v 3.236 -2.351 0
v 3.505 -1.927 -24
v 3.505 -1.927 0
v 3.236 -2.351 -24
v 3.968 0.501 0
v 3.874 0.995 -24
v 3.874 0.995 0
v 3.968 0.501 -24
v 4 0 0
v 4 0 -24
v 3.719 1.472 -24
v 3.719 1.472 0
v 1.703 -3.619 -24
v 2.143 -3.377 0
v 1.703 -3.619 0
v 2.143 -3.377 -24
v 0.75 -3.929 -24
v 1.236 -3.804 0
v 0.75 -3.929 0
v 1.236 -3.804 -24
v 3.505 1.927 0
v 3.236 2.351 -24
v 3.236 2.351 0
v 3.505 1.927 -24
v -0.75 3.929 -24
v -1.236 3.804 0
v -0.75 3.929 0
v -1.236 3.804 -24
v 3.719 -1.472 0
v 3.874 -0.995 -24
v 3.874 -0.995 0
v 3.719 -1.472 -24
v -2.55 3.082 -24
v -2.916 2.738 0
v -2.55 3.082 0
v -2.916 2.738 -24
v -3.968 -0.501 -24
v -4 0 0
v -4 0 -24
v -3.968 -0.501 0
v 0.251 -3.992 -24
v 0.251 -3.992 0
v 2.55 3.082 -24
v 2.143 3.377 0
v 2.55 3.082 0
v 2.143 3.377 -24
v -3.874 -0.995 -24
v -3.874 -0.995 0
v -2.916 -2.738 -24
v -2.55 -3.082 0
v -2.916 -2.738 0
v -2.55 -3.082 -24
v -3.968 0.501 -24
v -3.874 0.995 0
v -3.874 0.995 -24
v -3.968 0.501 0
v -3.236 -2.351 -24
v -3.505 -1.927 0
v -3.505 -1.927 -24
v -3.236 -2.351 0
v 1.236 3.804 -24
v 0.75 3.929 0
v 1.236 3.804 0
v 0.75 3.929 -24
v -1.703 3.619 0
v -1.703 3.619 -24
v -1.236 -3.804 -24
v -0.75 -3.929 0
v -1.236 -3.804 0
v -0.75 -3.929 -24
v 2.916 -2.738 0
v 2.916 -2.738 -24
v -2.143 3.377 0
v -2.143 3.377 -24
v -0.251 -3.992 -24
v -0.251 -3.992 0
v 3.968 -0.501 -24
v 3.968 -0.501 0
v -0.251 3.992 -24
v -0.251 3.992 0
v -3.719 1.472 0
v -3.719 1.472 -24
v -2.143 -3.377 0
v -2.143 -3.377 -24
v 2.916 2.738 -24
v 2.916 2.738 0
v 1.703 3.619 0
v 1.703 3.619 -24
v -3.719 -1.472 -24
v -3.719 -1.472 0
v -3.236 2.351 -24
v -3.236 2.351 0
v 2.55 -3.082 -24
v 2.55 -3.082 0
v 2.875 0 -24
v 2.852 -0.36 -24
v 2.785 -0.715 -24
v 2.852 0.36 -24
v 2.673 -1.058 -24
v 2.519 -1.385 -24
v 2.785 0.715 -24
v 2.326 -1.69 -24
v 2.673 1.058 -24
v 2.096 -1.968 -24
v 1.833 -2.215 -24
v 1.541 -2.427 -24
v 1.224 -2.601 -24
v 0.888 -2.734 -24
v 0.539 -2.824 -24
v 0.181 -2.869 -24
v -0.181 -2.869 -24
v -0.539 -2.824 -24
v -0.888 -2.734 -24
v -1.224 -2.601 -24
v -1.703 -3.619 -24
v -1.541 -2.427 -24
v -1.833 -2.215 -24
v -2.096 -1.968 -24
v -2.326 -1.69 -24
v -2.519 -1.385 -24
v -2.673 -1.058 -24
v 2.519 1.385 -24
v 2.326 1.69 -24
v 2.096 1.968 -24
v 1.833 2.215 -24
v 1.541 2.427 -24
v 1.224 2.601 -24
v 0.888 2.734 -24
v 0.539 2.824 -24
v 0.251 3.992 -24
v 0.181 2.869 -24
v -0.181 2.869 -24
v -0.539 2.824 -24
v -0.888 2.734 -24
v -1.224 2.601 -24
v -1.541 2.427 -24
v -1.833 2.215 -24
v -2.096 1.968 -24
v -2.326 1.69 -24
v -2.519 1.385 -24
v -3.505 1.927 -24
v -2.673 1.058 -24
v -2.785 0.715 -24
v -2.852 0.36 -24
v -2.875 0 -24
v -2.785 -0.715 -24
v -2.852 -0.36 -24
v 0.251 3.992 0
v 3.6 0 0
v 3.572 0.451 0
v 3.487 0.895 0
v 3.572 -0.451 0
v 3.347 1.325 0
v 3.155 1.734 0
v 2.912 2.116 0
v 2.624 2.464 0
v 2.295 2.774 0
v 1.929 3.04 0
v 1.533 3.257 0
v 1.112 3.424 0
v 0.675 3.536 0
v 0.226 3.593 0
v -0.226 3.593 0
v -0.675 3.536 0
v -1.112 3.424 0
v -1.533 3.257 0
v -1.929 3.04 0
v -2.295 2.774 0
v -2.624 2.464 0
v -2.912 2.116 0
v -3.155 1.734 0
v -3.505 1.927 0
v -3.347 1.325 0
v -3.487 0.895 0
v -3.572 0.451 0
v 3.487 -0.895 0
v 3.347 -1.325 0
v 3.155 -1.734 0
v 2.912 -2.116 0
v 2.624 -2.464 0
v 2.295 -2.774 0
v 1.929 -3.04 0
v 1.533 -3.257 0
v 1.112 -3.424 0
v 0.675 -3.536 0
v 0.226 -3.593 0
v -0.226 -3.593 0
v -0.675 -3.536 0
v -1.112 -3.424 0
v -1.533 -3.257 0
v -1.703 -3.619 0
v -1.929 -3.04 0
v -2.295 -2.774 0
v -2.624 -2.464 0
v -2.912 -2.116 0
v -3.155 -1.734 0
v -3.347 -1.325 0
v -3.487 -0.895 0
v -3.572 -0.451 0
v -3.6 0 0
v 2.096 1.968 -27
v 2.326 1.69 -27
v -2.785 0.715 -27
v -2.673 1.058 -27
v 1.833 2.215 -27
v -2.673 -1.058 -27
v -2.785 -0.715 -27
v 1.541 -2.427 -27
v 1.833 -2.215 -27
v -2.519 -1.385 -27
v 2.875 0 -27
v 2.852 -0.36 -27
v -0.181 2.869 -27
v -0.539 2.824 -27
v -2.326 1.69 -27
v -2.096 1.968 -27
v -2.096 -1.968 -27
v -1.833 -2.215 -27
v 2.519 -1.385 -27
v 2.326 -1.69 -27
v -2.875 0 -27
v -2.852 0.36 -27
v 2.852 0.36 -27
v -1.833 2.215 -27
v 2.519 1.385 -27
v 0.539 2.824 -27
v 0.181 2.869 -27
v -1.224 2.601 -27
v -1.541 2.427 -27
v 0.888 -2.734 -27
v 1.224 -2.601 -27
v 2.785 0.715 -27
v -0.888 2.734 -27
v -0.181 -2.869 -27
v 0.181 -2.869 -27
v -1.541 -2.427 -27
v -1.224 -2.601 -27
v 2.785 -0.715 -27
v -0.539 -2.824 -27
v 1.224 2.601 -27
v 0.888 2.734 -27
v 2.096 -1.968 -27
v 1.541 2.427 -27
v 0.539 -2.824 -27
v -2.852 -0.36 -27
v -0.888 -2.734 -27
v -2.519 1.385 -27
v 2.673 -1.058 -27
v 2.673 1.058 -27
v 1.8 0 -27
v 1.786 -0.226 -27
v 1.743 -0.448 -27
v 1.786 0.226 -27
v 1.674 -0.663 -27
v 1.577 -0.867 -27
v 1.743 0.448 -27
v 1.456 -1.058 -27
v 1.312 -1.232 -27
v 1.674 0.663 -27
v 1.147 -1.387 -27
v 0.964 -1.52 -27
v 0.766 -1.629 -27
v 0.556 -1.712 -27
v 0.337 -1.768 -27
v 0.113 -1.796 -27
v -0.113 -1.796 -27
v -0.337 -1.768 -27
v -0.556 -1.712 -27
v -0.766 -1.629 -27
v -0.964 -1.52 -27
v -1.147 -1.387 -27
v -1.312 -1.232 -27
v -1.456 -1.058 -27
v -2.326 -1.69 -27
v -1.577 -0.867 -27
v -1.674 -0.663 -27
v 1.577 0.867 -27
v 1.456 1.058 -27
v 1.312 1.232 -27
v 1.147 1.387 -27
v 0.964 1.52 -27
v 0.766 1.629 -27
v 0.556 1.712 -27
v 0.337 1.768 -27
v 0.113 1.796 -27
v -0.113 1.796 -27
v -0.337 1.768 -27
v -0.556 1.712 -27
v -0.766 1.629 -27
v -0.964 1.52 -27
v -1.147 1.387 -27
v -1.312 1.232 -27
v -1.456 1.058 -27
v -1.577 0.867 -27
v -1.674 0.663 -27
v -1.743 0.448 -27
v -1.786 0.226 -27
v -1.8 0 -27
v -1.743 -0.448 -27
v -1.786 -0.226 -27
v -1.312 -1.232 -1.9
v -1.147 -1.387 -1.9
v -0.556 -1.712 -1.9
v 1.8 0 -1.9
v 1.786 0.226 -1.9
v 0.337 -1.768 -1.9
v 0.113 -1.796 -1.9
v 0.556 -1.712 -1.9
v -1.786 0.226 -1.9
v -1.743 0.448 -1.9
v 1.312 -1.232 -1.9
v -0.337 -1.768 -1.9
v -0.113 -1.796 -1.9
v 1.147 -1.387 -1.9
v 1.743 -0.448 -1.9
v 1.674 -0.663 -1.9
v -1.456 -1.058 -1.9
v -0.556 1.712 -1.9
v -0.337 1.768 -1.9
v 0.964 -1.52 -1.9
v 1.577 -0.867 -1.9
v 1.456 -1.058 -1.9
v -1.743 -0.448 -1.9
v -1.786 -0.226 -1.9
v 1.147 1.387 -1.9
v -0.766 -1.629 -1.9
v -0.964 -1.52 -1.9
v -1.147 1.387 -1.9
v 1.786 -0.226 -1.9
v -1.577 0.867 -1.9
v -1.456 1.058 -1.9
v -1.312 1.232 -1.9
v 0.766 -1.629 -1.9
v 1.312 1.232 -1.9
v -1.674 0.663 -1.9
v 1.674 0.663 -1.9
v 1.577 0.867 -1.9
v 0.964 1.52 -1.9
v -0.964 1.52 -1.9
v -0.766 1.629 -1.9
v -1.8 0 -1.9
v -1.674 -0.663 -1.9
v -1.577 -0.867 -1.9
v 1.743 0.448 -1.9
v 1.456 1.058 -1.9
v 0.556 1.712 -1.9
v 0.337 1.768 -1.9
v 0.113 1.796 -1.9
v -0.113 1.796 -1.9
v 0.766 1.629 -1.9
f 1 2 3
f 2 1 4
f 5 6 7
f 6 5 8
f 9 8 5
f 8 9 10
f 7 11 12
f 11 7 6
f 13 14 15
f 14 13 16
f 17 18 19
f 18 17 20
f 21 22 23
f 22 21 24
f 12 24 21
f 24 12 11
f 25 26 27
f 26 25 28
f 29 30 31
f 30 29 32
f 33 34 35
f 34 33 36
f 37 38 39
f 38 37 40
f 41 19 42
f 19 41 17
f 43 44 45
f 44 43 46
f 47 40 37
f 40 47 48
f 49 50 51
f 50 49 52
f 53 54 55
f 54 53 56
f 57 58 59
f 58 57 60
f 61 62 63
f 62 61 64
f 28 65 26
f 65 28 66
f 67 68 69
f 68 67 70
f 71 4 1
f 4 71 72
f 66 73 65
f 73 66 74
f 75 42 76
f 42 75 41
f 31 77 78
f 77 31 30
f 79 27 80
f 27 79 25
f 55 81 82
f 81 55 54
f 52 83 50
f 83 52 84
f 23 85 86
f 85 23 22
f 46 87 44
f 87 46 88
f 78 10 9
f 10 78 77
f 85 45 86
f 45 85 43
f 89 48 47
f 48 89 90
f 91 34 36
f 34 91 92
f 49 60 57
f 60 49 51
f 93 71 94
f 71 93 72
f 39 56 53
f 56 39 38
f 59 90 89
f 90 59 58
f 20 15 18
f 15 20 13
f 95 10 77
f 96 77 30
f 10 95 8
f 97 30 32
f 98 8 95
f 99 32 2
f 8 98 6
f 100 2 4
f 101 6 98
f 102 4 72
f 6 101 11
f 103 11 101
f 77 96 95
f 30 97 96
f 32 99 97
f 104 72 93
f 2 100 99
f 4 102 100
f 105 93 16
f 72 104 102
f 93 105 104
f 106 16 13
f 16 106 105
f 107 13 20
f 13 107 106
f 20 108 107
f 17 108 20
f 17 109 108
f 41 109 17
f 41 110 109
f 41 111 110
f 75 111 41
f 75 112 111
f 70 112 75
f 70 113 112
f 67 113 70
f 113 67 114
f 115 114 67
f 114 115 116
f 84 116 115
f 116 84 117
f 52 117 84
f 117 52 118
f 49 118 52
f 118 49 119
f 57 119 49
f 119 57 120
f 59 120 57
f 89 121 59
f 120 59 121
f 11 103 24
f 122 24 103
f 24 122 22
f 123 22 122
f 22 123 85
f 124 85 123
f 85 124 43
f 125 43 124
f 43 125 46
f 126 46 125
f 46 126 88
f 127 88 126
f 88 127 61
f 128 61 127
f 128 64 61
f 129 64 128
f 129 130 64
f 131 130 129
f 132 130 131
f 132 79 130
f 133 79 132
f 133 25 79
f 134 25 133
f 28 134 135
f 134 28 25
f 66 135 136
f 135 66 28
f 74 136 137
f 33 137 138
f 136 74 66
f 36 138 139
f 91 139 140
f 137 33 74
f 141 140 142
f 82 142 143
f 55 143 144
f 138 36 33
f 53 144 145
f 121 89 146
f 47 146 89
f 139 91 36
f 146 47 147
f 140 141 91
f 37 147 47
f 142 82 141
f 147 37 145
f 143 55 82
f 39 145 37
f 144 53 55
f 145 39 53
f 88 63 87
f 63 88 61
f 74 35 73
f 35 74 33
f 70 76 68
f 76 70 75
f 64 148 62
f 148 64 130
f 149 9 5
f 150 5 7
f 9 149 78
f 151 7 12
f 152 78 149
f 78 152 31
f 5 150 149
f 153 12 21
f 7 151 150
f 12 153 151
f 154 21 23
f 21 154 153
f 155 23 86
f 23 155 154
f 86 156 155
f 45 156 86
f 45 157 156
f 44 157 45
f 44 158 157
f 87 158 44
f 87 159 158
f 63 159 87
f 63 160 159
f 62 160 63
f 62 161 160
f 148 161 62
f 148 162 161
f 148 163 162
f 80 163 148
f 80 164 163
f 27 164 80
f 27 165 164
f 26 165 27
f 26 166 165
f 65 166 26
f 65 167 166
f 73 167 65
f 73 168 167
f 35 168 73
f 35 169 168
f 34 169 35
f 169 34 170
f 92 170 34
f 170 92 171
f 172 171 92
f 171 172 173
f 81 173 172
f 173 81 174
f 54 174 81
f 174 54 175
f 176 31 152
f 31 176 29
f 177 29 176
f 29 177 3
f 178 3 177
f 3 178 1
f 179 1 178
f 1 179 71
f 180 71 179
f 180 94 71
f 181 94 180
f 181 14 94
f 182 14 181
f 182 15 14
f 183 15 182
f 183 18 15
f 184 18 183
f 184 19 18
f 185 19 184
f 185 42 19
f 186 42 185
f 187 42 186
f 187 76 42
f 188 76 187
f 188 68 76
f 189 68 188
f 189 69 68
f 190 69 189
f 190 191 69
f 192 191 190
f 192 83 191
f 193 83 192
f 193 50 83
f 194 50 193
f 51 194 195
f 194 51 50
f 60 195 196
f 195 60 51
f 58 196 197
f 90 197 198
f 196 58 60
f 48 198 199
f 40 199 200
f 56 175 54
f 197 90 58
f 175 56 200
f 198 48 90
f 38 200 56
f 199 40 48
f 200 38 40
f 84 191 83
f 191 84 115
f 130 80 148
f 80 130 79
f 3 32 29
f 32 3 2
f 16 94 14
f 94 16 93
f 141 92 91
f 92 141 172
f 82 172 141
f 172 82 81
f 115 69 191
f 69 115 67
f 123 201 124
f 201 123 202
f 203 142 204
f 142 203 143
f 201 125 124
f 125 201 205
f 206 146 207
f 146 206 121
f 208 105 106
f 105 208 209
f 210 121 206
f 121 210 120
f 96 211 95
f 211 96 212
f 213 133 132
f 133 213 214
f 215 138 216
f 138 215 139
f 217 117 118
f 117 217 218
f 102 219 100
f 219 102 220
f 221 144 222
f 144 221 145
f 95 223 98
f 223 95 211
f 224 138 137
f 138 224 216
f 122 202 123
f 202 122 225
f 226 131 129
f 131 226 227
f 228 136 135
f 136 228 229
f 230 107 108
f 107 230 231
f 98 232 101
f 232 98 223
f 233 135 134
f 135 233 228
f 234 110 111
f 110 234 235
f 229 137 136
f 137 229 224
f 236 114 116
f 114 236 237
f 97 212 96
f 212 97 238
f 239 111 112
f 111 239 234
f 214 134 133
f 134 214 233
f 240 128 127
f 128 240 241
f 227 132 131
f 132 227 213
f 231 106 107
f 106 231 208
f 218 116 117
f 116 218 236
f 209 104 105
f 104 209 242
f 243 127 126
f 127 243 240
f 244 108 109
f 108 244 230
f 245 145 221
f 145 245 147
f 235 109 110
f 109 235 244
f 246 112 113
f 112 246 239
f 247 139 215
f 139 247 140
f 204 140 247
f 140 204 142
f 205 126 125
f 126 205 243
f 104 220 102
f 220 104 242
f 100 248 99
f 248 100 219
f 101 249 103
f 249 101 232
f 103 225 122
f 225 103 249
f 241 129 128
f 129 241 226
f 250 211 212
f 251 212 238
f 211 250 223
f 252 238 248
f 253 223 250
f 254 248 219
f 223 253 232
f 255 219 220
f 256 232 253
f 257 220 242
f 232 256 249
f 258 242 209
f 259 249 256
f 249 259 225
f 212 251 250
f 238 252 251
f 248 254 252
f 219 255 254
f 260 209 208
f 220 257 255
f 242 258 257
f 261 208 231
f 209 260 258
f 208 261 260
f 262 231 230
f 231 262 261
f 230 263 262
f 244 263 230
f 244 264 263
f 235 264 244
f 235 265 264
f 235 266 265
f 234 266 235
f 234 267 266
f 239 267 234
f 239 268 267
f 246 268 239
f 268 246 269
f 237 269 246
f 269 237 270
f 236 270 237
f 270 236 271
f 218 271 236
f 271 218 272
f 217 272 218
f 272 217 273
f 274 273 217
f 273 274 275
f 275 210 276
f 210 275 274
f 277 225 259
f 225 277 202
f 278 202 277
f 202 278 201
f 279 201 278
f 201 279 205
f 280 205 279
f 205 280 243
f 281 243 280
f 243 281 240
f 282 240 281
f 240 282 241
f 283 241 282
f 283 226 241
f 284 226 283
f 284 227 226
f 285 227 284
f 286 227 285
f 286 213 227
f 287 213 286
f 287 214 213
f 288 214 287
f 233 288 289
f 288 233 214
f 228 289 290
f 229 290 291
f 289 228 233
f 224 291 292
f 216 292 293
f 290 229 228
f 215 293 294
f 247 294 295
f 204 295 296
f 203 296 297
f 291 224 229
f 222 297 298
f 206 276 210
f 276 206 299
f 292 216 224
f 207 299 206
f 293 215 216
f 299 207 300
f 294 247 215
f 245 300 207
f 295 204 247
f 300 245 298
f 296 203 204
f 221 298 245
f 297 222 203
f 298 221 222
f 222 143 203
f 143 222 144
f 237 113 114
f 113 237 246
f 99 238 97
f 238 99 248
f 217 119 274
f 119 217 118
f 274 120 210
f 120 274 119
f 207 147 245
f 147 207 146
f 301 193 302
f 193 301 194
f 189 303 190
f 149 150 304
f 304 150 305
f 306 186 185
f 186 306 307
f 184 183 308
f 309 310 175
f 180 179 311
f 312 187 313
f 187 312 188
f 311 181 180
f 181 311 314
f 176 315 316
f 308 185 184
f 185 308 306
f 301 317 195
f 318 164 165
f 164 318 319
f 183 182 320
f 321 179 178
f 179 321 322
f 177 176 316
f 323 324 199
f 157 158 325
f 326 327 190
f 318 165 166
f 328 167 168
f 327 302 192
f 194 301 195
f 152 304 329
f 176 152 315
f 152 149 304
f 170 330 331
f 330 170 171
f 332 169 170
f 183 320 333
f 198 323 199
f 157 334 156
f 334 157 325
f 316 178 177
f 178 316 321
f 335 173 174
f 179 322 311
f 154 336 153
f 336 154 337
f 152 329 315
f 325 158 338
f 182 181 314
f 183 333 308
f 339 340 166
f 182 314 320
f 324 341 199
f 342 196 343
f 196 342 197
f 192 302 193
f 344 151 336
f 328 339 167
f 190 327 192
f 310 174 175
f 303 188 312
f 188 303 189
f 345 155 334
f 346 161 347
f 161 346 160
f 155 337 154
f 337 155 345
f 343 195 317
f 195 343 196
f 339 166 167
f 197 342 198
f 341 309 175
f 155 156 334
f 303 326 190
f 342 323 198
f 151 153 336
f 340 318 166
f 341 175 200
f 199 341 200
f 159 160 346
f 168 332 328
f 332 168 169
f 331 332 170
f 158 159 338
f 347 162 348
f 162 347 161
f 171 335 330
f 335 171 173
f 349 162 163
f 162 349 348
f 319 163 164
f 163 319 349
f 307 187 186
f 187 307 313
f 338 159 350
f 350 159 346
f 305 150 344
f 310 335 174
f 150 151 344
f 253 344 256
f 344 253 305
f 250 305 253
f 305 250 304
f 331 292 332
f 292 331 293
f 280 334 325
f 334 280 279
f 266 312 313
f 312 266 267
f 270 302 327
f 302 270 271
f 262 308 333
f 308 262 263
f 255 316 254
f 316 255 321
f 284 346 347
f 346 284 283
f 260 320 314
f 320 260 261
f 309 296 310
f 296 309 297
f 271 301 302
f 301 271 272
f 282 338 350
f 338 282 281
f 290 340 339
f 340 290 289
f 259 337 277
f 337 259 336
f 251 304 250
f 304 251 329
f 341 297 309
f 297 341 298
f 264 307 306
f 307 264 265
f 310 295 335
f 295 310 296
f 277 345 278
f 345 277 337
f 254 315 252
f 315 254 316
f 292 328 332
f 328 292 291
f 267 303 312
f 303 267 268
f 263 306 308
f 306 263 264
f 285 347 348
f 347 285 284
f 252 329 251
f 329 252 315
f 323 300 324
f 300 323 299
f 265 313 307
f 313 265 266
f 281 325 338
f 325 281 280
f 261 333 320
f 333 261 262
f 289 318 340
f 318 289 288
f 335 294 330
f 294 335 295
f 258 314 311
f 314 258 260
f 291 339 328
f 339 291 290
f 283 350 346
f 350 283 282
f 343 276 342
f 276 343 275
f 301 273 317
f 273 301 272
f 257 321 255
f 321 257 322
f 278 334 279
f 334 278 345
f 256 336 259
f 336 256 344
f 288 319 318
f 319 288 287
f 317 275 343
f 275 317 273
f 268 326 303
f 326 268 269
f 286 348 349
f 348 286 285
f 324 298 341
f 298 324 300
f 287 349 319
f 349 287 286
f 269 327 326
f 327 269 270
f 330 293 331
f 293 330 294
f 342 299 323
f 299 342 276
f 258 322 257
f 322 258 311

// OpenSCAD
$fn = 50;

difference() {
	union() {
		translate(v = [0, 0, -24.0]) {
			cylinder(h = 24, r = 4.0);
		}
		#translate(v = [0, 0, -27.0]) {
			cylinder(h = 27, r = 2.875);
		}
	}
	union() {
		translate(v = [0, 0, 0]) {
			rotate(a = [0, 0, 0]) {
				difference() {
					union() {
						translate(v = [0, 0, -27.0]) {
							cylinder(h = 27, r = 1.5);
						}
						translate(v = [0, 0, -1.9]) {
							cylinder(h = 1.9, r1 = 1.8, r2 = 3.6);
						}
						translate(v = [0, 0, -27.0]) {
							cylinder(h = 27, r = 1.8);
						}
						translate(v = [0, 0, -27.0]) {
							cylinder(h = 27, r = 1.5);
						}
					}
					union();
				}
			}
		}
	}
}
